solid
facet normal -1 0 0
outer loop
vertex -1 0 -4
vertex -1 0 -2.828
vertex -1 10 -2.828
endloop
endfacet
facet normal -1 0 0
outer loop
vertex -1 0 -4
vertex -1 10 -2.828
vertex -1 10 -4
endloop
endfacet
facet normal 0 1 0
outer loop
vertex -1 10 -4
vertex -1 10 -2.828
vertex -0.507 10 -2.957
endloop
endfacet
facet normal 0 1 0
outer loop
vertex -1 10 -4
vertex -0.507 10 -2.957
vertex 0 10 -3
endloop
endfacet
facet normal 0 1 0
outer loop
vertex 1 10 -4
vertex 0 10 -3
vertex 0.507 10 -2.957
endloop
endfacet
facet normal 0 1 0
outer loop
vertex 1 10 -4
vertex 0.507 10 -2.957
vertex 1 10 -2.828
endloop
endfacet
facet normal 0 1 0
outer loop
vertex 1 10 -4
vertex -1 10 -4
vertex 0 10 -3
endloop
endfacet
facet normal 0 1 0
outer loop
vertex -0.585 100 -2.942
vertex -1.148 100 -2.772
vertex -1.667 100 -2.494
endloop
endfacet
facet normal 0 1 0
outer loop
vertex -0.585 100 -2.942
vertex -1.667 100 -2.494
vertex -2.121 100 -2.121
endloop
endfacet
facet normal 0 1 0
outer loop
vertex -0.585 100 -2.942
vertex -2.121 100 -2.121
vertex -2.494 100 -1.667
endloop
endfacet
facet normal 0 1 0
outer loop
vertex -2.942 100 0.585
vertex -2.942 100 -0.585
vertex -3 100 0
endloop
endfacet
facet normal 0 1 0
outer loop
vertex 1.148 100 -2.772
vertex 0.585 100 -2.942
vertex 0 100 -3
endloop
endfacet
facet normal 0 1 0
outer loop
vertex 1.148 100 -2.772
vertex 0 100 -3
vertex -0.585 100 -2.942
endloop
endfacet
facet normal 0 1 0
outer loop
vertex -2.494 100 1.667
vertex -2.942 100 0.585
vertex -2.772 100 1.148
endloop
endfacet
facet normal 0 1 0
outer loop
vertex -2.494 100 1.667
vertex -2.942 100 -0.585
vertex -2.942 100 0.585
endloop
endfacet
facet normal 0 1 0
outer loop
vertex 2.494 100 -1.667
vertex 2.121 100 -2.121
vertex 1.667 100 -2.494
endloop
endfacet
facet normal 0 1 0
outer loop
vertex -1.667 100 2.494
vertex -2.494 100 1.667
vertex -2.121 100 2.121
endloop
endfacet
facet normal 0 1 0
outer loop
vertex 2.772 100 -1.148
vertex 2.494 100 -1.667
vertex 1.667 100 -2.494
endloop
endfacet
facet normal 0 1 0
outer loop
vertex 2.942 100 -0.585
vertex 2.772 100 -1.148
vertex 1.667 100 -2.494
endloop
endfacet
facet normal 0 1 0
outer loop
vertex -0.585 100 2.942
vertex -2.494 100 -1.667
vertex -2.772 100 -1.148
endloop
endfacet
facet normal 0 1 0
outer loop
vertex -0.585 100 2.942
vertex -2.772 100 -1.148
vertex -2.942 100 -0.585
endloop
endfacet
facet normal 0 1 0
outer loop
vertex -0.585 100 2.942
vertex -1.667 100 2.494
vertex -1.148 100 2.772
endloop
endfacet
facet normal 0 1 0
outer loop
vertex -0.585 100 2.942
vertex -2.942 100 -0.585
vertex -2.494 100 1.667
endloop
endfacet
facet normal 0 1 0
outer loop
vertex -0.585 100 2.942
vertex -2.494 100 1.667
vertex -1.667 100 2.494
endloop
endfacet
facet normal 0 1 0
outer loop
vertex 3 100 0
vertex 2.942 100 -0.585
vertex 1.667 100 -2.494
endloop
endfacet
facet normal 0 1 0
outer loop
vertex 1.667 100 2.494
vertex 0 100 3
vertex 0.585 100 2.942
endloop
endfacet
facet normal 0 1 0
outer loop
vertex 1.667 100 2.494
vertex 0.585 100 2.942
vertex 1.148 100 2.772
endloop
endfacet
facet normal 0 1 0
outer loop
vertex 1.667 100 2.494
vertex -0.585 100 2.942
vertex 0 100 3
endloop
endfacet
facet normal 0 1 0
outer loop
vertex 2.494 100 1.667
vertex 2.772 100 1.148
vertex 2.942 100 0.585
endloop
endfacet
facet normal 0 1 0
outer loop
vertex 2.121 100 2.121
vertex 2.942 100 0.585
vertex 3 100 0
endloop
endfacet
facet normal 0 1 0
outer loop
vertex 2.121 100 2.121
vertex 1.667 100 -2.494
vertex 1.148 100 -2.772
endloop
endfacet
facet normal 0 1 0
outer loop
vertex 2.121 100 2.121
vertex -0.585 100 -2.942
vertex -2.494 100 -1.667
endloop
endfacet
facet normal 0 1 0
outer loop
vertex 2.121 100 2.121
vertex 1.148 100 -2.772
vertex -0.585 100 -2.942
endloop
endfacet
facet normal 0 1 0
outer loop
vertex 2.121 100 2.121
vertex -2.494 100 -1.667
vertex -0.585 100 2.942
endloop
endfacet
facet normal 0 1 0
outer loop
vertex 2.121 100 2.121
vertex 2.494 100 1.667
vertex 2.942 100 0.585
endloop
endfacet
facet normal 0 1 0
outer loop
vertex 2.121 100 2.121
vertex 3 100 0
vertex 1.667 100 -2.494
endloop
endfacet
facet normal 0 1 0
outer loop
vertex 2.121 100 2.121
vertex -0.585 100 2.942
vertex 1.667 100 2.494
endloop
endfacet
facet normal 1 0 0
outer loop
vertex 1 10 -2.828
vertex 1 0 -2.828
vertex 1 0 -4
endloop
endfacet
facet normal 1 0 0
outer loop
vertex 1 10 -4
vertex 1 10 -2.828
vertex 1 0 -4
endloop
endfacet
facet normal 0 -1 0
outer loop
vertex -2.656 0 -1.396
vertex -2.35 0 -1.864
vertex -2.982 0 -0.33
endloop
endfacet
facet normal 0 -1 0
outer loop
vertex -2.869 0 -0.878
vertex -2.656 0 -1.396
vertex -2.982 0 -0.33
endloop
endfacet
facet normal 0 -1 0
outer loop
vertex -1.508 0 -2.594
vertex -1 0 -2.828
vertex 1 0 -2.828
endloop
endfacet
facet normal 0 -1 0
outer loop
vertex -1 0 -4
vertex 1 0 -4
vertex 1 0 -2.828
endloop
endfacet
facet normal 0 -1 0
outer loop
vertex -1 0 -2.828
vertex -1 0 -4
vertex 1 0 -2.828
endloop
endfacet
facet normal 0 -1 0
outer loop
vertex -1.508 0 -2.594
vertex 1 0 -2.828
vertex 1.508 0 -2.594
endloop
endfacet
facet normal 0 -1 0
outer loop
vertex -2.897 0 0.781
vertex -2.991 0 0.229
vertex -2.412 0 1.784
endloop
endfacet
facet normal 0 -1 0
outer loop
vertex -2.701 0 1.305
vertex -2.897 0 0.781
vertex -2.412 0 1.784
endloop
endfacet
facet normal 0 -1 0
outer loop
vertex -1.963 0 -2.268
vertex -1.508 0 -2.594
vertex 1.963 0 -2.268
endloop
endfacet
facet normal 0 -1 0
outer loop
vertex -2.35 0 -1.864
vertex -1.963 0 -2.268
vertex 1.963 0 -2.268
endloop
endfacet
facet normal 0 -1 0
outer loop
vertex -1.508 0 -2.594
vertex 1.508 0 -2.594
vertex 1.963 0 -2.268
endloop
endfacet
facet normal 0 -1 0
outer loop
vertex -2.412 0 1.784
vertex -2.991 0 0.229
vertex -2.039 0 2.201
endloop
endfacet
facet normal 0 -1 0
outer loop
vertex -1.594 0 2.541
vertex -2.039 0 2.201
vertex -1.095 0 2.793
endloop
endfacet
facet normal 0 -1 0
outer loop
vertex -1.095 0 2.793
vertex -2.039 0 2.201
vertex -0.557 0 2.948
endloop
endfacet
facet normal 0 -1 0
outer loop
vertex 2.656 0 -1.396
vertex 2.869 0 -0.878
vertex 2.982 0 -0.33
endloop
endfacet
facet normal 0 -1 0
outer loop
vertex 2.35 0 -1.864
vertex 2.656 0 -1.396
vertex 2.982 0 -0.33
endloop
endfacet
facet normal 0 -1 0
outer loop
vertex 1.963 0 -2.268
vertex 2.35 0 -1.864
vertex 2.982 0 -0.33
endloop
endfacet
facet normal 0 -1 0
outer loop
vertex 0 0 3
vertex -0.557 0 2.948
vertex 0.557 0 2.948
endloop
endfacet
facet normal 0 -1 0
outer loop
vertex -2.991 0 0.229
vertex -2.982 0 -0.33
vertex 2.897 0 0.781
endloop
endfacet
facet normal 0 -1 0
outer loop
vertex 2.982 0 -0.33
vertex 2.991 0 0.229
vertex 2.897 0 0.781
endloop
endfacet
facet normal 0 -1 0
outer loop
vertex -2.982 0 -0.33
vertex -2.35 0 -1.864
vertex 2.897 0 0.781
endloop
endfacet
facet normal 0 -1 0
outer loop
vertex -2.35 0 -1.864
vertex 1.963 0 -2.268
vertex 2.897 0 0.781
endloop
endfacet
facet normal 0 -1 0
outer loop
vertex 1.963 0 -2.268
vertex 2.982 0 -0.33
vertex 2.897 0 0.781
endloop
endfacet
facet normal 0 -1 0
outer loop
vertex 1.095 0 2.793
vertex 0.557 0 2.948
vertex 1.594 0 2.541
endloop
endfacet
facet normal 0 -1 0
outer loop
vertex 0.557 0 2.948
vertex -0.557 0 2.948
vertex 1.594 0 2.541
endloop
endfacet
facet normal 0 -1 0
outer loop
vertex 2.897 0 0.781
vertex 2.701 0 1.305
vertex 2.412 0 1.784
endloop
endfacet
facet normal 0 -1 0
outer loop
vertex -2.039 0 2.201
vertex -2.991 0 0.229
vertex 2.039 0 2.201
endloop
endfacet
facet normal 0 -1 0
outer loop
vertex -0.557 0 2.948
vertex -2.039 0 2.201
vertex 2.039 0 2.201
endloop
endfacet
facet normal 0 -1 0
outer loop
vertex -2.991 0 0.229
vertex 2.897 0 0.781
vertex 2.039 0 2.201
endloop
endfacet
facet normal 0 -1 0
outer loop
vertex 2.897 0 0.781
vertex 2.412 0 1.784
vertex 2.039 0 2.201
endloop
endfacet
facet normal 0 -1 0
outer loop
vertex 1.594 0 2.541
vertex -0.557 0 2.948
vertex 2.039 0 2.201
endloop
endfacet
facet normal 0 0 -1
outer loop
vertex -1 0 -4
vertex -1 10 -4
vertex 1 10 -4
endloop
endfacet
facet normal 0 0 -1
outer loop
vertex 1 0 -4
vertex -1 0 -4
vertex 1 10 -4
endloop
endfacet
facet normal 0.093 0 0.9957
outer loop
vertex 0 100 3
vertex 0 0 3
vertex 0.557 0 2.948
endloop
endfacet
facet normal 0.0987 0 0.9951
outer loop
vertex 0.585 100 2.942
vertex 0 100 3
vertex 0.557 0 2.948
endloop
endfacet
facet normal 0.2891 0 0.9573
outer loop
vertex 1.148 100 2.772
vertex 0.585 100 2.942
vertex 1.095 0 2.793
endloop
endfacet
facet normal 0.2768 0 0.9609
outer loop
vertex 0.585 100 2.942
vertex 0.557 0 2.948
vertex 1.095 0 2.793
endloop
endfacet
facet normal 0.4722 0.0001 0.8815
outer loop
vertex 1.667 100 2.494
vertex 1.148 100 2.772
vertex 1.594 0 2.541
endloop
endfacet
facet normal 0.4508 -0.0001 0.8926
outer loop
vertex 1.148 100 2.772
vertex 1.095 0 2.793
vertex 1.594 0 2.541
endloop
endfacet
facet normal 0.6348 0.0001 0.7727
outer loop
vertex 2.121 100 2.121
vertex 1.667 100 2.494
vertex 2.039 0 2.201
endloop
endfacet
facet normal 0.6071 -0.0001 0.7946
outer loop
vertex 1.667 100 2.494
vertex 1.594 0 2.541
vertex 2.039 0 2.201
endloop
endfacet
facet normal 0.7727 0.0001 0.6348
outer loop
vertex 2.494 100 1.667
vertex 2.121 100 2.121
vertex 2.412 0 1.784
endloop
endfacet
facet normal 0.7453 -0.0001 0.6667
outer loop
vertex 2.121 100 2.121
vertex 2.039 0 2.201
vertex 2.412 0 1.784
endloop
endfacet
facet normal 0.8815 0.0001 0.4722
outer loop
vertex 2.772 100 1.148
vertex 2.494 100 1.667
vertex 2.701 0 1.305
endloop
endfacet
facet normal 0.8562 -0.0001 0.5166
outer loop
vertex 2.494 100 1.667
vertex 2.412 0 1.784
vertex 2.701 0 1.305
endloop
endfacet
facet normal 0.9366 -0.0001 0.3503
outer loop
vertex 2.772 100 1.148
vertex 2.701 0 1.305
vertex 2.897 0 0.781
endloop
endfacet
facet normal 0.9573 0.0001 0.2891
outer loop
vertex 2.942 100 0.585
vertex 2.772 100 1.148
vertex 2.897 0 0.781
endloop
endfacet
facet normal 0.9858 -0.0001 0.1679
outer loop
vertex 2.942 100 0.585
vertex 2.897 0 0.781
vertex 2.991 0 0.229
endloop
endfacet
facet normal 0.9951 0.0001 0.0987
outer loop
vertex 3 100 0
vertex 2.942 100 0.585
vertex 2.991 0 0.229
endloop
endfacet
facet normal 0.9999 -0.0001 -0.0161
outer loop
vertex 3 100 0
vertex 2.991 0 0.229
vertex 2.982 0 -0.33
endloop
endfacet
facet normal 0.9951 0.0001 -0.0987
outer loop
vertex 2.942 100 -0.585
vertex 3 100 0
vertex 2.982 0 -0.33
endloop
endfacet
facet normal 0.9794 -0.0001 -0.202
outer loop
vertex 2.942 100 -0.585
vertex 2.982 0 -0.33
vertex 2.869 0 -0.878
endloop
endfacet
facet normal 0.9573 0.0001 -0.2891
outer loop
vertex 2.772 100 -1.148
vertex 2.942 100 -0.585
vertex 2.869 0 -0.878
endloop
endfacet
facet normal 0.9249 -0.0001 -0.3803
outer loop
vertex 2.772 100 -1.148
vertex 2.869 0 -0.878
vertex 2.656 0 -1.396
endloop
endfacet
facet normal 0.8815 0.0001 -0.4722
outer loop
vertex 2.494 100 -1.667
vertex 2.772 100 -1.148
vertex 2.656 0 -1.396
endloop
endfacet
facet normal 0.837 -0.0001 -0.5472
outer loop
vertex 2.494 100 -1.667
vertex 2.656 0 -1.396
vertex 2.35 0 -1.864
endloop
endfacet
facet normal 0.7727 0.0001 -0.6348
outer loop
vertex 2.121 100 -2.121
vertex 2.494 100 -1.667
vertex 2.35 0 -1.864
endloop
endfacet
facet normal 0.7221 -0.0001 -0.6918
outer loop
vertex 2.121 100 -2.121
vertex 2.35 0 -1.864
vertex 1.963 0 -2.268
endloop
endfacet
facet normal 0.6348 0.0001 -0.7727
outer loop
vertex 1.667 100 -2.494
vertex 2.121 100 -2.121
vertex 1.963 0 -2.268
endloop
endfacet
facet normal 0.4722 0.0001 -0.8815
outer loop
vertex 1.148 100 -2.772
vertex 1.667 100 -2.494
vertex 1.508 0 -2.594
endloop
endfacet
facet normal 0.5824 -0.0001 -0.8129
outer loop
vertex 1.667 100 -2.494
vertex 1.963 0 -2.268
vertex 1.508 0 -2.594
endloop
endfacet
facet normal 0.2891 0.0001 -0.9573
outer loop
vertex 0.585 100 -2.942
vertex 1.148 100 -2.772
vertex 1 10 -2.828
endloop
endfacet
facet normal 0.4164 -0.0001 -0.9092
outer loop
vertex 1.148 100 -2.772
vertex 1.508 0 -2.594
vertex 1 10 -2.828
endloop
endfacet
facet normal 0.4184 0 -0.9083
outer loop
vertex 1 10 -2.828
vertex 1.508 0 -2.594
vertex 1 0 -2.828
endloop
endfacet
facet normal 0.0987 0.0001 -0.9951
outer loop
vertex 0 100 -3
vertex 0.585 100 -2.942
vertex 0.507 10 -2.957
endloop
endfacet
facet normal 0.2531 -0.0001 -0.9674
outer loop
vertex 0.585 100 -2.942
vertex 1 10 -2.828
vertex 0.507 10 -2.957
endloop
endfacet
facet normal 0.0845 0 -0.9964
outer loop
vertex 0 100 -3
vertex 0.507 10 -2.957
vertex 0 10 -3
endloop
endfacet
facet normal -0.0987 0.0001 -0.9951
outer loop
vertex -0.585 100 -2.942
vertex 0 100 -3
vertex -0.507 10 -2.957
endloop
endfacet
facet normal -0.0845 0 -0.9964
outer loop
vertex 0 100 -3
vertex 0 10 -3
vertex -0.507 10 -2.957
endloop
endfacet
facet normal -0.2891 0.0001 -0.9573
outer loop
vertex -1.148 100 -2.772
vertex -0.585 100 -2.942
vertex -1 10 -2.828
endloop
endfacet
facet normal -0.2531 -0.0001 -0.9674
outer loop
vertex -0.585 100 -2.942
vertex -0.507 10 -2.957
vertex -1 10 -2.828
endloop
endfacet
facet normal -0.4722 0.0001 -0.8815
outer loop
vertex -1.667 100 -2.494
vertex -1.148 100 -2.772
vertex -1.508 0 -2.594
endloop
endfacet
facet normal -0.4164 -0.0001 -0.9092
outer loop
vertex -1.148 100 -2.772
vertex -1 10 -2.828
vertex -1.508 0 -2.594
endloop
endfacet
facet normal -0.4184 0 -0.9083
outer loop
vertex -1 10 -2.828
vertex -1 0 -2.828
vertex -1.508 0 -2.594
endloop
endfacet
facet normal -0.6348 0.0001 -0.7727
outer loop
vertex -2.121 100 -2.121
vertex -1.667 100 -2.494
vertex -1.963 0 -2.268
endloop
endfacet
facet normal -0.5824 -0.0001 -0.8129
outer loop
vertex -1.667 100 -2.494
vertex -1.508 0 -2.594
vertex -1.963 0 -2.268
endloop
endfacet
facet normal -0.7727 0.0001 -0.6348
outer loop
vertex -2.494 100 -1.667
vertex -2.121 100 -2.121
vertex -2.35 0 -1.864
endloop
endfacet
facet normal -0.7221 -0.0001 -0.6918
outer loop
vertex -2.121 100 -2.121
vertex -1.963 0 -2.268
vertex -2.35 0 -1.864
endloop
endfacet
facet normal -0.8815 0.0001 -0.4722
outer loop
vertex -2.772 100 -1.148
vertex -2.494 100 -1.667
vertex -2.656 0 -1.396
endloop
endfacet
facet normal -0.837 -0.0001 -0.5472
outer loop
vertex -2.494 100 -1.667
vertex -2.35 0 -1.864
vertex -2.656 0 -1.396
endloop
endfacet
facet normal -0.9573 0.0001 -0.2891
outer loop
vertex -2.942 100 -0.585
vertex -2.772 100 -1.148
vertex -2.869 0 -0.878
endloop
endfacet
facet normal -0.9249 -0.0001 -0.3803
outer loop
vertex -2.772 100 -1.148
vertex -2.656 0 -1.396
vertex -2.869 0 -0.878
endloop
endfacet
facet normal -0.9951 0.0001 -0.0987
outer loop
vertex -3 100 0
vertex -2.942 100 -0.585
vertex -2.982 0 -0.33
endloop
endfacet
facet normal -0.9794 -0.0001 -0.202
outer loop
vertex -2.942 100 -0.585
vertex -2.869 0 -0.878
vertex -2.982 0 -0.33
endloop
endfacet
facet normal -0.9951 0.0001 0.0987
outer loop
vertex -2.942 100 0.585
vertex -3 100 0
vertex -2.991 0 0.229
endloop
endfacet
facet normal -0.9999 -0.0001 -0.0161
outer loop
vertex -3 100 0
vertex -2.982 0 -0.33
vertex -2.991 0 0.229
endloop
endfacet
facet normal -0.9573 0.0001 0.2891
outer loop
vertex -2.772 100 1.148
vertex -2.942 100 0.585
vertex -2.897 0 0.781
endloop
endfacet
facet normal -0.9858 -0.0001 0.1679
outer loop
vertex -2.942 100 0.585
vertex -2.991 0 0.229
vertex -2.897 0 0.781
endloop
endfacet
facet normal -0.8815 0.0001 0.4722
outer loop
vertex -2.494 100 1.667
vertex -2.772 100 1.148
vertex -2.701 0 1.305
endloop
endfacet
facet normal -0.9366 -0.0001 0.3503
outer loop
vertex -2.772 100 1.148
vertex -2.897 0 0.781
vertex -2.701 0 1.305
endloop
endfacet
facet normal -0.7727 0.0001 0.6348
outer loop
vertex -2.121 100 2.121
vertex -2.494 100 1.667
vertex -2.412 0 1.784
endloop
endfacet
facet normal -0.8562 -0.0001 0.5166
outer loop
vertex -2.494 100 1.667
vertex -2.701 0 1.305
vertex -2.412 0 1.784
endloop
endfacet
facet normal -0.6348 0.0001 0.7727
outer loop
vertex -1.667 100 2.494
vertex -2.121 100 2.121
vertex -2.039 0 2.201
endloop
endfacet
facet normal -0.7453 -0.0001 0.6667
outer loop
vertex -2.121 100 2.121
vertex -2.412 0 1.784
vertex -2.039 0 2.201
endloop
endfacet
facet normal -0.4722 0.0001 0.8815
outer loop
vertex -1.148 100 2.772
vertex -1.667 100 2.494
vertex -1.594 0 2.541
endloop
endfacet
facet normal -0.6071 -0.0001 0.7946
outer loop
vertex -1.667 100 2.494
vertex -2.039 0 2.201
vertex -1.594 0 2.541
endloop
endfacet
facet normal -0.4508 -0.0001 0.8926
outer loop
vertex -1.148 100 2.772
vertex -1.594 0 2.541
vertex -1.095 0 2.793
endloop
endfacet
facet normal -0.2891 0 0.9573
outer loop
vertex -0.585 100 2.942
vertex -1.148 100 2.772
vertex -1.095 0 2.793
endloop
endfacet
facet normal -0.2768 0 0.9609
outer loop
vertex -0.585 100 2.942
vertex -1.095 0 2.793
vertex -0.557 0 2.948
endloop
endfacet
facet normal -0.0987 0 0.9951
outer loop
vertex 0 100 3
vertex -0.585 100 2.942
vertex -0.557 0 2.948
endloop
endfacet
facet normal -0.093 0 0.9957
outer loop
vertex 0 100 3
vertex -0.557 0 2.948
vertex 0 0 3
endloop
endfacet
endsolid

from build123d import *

# Parameters (mm, degrees)
SKETCH_1_R      = 3
EXTRUDE_1_DEPTH = 100
SKETCH_2_W      = 2
SKETCH_2_H      = 2
EXTRUDE_2_DEPTH = 10


with BuildPart() as part:
    # 스케치1 → 보스-돌출1 (new body)
    with BuildSketch(Plane(origin=(0, 0, 0), x_dir=(1, 0, 0), z_dir=(0, 1, 0))):
        with Locations(Location((0, 0, 0), (0, 0, 270))):
            Circle(SKETCH_1_R)
    extrude(amount=EXTRUDE_1_DEPTH)

    # 스케치2 → 보스-돌출2 (add)
    with BuildSketch(Plane(origin=(0, 0, 0), x_dir=(1, 0, 0), z_dir=(0, 1, 0))):
        with Locations((0, 3)):
            Rectangle(SKETCH_2_W, SKETCH_2_H)
    extrude(amount=EXTRUDE_2_DEPTH)


solid = part.part
